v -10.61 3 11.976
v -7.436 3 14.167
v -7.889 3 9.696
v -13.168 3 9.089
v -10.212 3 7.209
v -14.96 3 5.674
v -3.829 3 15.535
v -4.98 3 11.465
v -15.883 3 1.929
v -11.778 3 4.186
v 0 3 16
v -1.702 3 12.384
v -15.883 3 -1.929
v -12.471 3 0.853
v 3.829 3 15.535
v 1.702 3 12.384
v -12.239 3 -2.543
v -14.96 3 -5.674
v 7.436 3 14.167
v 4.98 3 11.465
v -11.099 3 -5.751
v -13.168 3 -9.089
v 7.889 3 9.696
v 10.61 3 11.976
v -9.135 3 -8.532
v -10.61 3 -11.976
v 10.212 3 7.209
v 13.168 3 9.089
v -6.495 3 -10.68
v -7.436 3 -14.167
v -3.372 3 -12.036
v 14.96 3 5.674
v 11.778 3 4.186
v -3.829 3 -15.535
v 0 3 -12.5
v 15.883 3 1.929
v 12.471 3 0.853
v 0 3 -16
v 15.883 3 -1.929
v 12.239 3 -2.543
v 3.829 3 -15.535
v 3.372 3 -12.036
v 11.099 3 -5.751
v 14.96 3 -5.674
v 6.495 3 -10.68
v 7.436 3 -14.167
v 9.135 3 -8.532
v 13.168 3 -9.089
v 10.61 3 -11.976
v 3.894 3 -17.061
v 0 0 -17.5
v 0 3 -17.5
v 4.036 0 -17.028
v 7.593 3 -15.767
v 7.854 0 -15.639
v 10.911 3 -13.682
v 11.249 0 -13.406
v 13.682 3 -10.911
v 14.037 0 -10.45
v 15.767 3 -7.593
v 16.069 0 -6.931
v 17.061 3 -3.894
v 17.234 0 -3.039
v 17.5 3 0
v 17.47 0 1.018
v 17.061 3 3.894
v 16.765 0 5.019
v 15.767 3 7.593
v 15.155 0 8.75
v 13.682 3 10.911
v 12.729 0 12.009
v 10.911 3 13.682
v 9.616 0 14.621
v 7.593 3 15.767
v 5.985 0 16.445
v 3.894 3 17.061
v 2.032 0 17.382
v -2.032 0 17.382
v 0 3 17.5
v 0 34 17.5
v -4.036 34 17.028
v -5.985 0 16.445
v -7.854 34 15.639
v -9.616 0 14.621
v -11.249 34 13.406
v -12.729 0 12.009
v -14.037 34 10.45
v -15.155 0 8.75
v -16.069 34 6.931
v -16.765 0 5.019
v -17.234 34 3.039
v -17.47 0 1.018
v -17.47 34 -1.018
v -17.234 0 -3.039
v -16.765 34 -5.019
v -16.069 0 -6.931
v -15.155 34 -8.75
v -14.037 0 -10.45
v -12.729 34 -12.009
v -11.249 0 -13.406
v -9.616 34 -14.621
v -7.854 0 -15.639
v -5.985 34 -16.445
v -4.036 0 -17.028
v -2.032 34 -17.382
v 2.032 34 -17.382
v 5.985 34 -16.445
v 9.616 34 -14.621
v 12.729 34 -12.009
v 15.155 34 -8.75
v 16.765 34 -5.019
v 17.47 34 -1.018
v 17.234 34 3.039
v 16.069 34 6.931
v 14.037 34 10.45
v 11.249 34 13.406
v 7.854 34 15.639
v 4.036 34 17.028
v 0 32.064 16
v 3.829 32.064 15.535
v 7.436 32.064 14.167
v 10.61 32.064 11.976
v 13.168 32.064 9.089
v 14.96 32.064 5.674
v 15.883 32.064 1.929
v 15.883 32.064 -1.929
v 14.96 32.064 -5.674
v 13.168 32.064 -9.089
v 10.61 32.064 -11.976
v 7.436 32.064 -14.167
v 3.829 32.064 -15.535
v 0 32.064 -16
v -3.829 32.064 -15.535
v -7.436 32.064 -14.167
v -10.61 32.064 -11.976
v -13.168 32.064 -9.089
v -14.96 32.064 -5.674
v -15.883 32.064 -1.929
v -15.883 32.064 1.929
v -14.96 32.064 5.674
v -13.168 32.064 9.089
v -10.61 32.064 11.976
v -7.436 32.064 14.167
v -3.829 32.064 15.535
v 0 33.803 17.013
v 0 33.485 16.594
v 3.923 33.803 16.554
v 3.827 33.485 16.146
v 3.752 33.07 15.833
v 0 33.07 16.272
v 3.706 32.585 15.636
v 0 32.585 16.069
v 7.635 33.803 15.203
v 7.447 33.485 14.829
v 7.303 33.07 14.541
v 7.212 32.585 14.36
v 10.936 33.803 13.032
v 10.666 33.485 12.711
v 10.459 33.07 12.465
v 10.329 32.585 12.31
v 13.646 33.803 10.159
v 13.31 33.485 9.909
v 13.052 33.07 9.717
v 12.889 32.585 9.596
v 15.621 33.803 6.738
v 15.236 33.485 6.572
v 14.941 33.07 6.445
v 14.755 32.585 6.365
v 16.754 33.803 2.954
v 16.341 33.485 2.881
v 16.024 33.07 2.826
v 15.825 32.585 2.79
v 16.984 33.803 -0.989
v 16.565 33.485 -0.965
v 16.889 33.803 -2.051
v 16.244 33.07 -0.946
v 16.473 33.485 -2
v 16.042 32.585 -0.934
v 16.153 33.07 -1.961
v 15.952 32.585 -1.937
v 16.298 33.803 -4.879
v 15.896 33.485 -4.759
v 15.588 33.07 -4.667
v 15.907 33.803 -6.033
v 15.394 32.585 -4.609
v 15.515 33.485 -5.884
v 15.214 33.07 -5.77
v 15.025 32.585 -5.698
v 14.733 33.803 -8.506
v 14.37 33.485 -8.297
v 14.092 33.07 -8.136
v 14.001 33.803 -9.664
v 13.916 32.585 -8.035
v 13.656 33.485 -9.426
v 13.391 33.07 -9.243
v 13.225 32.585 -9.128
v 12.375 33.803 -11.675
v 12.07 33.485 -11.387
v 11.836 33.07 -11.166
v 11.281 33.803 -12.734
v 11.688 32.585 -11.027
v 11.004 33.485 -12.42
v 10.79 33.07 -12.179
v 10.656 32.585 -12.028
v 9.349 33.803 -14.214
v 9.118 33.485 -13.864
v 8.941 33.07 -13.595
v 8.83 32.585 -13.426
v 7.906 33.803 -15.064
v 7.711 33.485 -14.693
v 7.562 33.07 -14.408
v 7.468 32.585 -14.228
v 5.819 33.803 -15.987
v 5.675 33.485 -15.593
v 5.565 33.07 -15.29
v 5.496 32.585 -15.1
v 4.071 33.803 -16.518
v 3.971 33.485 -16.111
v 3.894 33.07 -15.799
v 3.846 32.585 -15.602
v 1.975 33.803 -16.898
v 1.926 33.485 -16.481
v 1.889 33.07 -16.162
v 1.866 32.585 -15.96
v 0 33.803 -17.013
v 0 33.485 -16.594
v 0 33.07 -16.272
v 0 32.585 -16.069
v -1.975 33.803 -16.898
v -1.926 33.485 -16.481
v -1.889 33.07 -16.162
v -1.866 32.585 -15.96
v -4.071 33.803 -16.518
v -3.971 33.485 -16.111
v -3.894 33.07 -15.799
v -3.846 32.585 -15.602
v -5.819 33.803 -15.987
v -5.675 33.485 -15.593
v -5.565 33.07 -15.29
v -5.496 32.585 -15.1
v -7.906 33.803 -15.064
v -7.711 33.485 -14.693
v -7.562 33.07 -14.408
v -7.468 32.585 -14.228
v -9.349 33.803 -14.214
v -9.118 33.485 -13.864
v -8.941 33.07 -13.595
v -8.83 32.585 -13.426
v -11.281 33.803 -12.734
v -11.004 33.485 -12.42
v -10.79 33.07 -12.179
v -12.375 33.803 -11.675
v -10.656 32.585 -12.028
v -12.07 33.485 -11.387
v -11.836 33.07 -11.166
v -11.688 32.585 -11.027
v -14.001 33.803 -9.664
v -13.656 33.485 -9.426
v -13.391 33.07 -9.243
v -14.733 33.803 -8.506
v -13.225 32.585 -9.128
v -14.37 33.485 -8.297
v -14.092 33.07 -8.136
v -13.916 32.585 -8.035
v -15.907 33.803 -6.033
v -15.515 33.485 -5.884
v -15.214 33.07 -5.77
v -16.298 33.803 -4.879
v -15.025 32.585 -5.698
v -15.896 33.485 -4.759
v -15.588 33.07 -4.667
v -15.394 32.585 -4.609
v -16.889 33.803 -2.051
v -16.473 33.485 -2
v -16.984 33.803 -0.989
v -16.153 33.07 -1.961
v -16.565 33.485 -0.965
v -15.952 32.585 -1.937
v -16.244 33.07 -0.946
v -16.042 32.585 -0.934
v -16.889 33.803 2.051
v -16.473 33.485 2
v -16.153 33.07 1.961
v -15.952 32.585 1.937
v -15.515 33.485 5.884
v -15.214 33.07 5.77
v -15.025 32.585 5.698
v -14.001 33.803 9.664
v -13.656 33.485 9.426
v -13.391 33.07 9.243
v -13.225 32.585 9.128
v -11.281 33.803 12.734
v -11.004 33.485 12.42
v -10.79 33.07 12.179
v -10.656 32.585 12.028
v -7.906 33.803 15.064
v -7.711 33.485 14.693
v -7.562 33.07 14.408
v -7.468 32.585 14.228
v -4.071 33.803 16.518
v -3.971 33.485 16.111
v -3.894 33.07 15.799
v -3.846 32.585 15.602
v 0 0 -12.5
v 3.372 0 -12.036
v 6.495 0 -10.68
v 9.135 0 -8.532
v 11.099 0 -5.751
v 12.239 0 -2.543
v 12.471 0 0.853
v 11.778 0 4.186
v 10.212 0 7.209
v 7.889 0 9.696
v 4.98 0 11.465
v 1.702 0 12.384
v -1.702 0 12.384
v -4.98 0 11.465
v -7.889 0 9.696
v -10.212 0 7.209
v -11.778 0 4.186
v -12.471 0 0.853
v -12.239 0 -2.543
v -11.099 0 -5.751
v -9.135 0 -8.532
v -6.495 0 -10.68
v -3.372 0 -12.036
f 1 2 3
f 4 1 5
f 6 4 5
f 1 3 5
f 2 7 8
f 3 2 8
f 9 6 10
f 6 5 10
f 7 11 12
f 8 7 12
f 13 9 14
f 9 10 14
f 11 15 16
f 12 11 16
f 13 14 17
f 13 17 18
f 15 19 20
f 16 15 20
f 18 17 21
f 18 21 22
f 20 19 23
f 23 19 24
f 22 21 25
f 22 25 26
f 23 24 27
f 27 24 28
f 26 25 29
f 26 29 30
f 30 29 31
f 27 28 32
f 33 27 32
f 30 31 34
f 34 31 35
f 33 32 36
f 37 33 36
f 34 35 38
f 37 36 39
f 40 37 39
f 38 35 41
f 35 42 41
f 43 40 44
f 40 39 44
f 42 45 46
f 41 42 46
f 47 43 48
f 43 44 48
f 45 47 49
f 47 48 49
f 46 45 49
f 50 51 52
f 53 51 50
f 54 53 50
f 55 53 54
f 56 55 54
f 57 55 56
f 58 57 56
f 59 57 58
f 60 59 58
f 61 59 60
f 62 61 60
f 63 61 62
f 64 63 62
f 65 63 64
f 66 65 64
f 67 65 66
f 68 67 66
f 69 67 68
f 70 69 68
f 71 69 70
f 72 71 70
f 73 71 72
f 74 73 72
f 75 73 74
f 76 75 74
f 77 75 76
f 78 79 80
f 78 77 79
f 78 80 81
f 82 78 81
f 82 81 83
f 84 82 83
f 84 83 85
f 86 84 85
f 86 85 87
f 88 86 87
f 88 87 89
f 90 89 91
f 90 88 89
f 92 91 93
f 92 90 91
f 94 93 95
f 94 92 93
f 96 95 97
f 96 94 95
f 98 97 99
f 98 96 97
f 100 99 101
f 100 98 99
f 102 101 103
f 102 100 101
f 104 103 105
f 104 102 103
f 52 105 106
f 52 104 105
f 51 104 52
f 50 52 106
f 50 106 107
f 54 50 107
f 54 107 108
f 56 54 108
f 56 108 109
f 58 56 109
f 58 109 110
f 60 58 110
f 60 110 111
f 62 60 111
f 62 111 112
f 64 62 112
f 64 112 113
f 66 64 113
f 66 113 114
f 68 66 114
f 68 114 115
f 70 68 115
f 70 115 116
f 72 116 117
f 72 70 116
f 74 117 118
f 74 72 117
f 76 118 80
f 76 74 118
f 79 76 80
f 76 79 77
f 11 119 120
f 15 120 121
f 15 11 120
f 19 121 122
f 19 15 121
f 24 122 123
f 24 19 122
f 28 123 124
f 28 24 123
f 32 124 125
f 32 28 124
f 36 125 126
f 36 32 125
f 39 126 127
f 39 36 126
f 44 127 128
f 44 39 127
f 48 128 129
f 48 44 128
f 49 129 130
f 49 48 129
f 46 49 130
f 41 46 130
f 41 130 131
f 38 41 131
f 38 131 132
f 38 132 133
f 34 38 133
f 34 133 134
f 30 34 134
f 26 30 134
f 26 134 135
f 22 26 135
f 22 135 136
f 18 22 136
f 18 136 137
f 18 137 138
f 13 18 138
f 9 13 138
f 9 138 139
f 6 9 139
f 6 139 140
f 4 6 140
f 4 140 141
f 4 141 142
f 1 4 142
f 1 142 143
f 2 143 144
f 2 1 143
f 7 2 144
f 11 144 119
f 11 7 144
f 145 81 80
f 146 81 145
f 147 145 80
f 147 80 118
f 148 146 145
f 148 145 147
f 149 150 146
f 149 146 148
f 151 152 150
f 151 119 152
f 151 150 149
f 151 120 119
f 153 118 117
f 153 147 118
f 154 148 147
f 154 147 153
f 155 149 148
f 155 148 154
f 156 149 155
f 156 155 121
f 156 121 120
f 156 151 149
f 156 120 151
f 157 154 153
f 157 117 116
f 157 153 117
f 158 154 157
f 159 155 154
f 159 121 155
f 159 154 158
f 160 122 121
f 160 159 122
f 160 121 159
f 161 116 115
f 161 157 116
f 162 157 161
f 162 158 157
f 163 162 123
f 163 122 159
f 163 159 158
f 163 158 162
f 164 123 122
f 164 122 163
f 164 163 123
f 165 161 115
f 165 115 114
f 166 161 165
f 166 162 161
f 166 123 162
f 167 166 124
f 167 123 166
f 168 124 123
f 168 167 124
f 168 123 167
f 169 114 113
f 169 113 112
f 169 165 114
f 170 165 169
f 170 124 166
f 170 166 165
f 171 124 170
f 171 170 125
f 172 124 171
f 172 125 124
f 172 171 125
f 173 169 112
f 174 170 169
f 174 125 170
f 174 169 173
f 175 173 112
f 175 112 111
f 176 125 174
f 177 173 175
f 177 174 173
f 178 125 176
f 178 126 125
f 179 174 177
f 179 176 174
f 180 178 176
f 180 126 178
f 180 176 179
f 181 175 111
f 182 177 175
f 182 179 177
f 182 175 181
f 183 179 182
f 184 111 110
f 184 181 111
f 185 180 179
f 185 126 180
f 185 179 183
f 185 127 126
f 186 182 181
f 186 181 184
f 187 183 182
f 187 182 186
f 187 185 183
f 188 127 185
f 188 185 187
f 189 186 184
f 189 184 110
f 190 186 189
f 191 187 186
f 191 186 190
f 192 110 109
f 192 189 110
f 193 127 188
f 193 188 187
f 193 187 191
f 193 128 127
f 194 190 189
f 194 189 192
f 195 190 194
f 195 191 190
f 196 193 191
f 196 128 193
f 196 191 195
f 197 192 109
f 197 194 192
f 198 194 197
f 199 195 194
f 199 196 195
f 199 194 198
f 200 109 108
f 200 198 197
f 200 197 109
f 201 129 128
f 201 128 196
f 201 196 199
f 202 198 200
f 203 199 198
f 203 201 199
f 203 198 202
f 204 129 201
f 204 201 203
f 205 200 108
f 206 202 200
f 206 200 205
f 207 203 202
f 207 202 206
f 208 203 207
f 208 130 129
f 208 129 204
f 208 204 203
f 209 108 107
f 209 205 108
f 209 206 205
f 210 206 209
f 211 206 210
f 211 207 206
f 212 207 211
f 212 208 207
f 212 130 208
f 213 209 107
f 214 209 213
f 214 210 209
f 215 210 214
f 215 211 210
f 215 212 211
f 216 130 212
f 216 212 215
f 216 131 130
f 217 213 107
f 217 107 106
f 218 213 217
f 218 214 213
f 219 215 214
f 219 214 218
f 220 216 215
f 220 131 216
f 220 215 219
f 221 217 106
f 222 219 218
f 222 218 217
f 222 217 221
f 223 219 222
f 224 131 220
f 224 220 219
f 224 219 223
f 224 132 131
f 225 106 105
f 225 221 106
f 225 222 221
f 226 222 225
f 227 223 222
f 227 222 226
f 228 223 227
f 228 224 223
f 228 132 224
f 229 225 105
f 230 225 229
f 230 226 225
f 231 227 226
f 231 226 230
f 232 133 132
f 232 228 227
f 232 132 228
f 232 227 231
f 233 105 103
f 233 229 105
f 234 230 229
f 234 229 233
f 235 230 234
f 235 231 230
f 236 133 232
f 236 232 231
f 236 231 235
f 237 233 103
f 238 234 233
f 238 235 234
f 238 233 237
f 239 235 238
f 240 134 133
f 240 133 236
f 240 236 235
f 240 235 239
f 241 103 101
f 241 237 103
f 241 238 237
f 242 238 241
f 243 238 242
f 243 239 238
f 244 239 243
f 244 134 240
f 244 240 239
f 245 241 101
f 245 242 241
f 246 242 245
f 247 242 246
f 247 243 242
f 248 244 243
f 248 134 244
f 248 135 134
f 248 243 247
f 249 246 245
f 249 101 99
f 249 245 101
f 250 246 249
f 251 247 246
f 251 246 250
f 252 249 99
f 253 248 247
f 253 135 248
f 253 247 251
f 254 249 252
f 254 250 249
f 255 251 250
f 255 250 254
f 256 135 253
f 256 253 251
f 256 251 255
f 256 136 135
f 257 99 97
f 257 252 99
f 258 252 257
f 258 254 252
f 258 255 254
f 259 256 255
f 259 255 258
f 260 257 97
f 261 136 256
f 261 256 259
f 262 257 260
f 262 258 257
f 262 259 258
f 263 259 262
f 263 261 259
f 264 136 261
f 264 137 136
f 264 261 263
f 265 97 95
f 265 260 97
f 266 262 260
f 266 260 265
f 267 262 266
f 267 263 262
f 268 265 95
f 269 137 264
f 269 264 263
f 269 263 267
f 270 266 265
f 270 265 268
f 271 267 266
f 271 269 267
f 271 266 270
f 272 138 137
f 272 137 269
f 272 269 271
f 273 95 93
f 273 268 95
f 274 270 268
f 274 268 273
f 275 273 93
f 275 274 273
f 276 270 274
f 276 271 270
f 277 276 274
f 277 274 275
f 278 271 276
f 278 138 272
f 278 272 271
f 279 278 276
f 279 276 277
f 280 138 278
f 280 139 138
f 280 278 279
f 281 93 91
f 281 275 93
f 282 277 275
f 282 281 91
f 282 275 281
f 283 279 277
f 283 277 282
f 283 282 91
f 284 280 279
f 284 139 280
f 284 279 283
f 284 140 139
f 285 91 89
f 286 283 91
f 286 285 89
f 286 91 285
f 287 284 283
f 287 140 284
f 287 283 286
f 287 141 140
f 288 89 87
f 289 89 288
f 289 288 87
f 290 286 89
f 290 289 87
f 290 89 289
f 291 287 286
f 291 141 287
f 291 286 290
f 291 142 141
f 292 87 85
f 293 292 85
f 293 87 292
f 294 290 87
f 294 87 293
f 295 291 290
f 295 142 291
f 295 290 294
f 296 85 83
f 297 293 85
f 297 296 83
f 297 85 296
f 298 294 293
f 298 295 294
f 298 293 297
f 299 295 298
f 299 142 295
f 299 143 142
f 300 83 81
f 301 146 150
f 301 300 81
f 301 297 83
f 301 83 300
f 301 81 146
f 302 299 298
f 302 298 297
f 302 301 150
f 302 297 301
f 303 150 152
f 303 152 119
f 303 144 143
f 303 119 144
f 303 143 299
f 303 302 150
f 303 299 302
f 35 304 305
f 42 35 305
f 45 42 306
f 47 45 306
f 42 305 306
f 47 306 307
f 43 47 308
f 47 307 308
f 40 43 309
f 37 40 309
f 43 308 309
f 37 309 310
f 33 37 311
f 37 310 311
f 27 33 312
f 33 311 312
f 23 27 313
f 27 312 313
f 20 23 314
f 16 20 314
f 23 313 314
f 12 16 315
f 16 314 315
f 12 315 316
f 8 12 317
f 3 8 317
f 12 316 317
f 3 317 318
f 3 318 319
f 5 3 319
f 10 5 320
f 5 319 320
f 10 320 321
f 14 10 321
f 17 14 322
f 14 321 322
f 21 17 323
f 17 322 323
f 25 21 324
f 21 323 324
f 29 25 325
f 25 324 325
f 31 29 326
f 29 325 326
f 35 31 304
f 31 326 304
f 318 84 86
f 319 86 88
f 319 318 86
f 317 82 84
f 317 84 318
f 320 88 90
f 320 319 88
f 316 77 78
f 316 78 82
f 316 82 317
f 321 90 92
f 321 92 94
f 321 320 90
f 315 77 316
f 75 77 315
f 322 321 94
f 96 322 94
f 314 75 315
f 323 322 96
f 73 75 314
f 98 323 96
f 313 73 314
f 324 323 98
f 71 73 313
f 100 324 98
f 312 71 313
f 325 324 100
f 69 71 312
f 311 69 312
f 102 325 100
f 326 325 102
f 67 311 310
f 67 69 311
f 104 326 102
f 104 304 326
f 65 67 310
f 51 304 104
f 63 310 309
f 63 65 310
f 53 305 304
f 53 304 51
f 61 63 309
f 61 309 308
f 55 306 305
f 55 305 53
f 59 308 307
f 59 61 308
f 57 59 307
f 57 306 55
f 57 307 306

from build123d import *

# Parameters (mm, degrees)
SKETCH1_R            = 17.5
SKETCH1_R_2          = 16
BOSS_EXTRUDE1_DEPTH  = 34
SKETCH2_R            = 17.5
BOSS_EXTRUDE2_DEPTH  = 3
FILLET1_R            = 2
SKETCH3_R            = 11
BOSS_EXTRUDE3_DEPTH  = 30
CUT_EXTRUDE1_DEPTH   = 35
SKETCH6_W            = 7.99098924
SKETCH6_H            = 6.392791393
BOSS_EXTRUDE4_DEPTH  = 24
SPLIT1_OUTLINE_R     = 11
SPLIT1_DEPTH         = 33
SPLIT1_2_OUTLINE_R   = 17.5
SPLIT1_2_OUTLINE_R_2 = 11
SPLIT1_2_DEPTH       = 3
SKETCH7_R            = 17.5
SKETCH7_R_2          = 16
BOSS_EXTRUDE5_DEPTH  = 3
SKETCH8_R            = 17.5
SKETCH8_R_2          = 12.5
BOSS_EXTRUDE6_DEPTH  = 3


# Read off the part's stored shape, not the designer's step: Split1
with BuildPart() as part:
    # Sketch1 → Boss-Extrude1 (new body)
    with BuildSketch(Plane(origin=(0, 0, 0), x_dir=(1, 0, 0), z_dir=(0, 1, 0))):
        with Locations(Location((0, 0, 0), (0, 0, 270))):
            Circle(SKETCH1_R)
        with Locations(Location((0, 0, 0), (0, 0, 270))):
            Circle(SKETCH1_R_2, mode=Mode.SUBTRACT)
    extrude(amount=BOSS_EXTRUDE1_DEPTH)

    # Sketch2 → Boss-Extrude2 (add)
    with BuildSketch(Plane(origin=(0, 0, 0), x_dir=(1, 0, 0), z_dir=(0, 1, 0))):
        with Locations(Location((0, 0, 0), (0, 0, 270))):
            Circle(SKETCH2_R)
    extrude(amount=BOSS_EXTRUDE2_DEPTH)

    # Fillet1
    # the kernel refuses this fillet: 2 mm, written as the material it takes off along each edge
    with BuildSketch(Plane(origin=(0, 34, 0), x_dir=(0, 0, 1), z_dir=(-1, 0, 0))) as fillet1_piece_1:
        with BuildLine():
            CenterArc((18, -1.936491673), FILLET1_R, 104.477512186, 75.522487814)
            Line((16, -1.936491673), (15.96, -1.936491673))
            Line((15.96, -1.936491673), (15.96, 0))
            Line((15.96, 0), (16, 0.04))
            ThreePointArc((16, 0.04), (16.75, 0.04), (17.49, 0.038729833))
            Line((17.49, 0.038729833), (17.5, 0))
        make_face()
    revolve(axis=Axis((0, 34, 0), (0, 1, 0)), mode=Mode.SUBTRACT)

    # Sketch3 → Boss-Extrude3 (add)
    with BuildSketch(Plane(origin=(0, 3, 0), x_dir=(1, 0, 0), z_dir=(0, 1, 0))):
        with Locations(Location((0, 0, 0), (0, 0, 270))):
            Circle(SKETCH3_R)
    extrude(amount=BOSS_EXTRUDE3_DEPTH)

    # Sketch5 → Cut-Extrude1 (cut)
    with BuildSketch(Plane(origin=(0, 33, 0), x_dir=(1, 0, 0), z_dir=(0, 1, 0))):
        with BuildLine():
            Line((-1.077438314, 1.385334501), (1.077438314, 1.385334501))
            ThreePointArc((1.077438314, 1.385334501), (0, -1.755), (-1.077438314, 1.385334501))
        make_face()
    extrude(amount=-CUT_EXTRUDE1_DEPTH, mode=Mode.SUBTRACT)

    # Sketch6 → Boss-Extrude4 (add)
    with BuildSketch(Plane(origin=(0, 33, 0), x_dir=(1, 0, 0), z_dir=(0, 1, 0))):
        with Locations((0.014035957, -0.788514839)):
            Rectangle(SKETCH6_W, SKETCH6_H)
    extrude(amount=-BOSS_EXTRUDE4_DEPTH)

    # Split1 outline → Split1 (cut)
    with BuildSketch(Plane(origin=(0, 0, 0), x_dir=(1, 0, 0), z_dir=(0, 1, 0))):
        Circle(SPLIT1_OUTLINE_R)
    extrude(amount=SPLIT1_DEPTH, mode=Mode.SUBTRACT)

    # Split1 2 outline → Split1 2 (cut)
    with BuildSketch(Plane(origin=(0, 0, 0), x_dir=(1, 0, 0), z_dir=(0, 1, 0))):
        Circle(SPLIT1_2_OUTLINE_R)
        Circle(SPLIT1_2_OUTLINE_R_2, mode=Mode.SUBTRACT)
    extrude(amount=SPLIT1_2_DEPTH, mode=Mode.SUBTRACT)

    # Sketch7 → Boss-Extrude5 (add)
    with BuildSketch(Plane(origin=(0, 0, 0), x_dir=(-1, 0, 0), z_dir=(0, -1, 0))):
        with Locations(Location((0, 0, 0), (0, 0, 90))):
            Circle(SKETCH7_R)
        with Locations(Location((0, 0, 0), (0, 0, 90))):
            Circle(SKETCH7_R_2, mode=Mode.SUBTRACT)
    extrude(amount=-BOSS_EXTRUDE5_DEPTH)

    # Sketch8 → Boss-Extrude6 (add)
    with BuildSketch(Plane(origin=(0, 0, 0), x_dir=(-1, 0, 0), z_dir=(0, -1, 0))):
        with Locations(Location((0, 0, 0), (0, 0, 90))):
            Circle(SKETCH8_R)
        with Locations(Location((0, 0, 0), (0, 0, 90))):
            Circle(SKETCH8_R_2, mode=Mode.SUBTRACT)
    extrude(amount=-BOSS_EXTRUDE6_DEPTH)


solid = part.part
